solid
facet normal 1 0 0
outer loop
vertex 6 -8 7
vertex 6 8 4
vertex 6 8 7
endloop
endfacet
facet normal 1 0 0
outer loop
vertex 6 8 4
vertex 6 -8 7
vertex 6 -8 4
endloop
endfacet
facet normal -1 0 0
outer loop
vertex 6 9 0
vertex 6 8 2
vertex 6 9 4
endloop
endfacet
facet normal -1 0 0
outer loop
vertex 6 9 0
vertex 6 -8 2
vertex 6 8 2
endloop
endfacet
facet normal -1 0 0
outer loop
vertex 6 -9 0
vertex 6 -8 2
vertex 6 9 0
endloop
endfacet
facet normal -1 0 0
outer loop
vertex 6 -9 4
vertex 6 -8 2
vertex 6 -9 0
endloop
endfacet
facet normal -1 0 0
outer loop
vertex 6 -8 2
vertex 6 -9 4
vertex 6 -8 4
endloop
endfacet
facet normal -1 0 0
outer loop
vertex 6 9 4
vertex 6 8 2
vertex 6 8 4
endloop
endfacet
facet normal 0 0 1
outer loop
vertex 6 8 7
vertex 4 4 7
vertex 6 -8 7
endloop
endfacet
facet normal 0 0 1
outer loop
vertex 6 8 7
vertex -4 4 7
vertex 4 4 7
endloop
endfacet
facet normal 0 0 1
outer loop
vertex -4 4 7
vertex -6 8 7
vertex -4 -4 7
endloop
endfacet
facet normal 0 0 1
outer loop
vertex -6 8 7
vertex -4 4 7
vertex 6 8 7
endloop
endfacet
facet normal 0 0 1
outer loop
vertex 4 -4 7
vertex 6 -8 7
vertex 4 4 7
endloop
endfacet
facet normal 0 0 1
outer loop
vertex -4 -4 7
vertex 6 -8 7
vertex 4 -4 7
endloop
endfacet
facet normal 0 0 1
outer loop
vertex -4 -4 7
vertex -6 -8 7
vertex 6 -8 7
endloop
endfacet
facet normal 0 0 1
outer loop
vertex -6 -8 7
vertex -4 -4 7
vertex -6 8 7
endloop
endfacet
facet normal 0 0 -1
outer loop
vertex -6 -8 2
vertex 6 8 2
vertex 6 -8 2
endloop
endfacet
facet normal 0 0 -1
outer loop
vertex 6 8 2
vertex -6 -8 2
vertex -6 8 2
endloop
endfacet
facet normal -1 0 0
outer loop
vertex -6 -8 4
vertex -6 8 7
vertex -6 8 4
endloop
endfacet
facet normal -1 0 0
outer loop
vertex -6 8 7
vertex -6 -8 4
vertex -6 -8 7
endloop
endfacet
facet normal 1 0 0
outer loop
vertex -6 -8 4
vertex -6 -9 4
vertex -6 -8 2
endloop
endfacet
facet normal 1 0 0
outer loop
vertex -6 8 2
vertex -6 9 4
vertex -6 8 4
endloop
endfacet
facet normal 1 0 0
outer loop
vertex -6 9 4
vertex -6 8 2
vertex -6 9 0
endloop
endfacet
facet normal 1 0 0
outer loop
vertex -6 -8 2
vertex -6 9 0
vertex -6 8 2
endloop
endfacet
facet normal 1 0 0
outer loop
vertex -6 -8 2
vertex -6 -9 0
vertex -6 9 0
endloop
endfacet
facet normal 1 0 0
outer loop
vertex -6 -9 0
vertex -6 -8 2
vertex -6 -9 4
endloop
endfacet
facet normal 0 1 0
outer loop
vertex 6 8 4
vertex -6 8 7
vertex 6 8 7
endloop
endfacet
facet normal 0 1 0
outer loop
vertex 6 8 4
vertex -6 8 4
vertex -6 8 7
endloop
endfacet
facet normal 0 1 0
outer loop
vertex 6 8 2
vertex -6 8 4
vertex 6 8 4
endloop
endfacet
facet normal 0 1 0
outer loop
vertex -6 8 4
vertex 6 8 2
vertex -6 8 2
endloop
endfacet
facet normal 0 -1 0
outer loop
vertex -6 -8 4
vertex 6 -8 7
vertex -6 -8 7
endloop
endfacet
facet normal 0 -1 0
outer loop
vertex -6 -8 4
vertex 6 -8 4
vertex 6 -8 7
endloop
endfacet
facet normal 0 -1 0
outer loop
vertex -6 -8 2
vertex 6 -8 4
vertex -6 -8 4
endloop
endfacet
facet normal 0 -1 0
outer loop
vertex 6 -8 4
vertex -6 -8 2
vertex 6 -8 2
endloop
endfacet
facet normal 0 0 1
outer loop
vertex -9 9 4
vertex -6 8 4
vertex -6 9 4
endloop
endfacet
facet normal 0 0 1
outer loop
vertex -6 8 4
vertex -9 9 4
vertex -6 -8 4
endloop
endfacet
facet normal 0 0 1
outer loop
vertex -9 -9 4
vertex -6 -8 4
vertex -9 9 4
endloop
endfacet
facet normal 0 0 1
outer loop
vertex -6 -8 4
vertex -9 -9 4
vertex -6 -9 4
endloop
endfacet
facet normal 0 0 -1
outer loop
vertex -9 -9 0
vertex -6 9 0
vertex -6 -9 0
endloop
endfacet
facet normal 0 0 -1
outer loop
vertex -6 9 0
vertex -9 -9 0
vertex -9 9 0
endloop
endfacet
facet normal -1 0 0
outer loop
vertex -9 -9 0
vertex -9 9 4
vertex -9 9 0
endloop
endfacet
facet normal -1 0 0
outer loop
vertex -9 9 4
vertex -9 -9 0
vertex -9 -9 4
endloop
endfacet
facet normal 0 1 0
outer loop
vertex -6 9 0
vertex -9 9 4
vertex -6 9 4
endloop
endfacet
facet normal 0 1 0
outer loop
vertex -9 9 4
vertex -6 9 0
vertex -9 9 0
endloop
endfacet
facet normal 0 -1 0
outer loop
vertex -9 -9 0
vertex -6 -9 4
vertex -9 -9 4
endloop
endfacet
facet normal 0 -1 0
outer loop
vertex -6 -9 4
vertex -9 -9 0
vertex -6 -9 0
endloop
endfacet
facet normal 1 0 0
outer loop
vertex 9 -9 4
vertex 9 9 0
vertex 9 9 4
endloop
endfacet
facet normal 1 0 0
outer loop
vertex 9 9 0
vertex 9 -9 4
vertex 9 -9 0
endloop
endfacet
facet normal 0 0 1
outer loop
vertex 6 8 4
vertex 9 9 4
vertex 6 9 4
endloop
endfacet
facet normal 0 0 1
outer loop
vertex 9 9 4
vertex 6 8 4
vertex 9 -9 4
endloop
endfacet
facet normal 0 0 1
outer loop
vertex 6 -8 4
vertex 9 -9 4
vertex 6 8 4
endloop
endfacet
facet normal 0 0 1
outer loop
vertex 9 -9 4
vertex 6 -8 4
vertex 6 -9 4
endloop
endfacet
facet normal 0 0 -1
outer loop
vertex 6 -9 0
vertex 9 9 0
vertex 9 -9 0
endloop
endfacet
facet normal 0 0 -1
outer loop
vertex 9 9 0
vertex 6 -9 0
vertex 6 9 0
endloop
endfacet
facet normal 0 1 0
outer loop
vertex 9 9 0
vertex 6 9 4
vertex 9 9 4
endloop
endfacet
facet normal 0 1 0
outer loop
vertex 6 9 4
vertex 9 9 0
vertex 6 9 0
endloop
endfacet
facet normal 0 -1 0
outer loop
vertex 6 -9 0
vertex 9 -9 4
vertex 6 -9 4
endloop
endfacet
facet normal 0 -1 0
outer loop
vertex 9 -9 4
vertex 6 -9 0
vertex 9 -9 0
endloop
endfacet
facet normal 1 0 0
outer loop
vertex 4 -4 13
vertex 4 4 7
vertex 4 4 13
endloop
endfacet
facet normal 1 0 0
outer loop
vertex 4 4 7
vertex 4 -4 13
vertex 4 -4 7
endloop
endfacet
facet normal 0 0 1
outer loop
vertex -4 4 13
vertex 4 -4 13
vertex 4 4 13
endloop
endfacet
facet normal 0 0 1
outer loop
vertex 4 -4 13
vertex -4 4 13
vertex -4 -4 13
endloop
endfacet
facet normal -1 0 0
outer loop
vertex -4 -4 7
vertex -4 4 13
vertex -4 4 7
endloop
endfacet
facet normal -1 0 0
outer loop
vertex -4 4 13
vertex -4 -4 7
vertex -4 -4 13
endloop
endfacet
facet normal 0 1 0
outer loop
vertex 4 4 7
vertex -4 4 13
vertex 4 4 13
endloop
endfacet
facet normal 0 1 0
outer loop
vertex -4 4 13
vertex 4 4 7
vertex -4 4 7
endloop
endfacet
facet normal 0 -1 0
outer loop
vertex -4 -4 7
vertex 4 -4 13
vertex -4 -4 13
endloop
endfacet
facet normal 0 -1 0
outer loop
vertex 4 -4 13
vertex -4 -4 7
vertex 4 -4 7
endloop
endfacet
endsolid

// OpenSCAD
// Bulldozer Body
body_width = 12;
body_length = 16;
body_height = 5;

// Treads
tread_width = 3;
tread_height = 4;
tread_length = 18;

// Cabin
cabin_width = 8;
cabin_length = 8;
cabin_height = 6;

union() {
    // Chassis
    translate([-body_width/2, -body_length/2, tread_height/2])
        cube([body_width, body_length, body_height]);

    // Left Tread
    translate([-(body_width/2 + tread_width), -tread_length/2, 0])
        cube([tread_width, tread_length, tread_height]);

    // Right Tread
    translate([body_width/2, -tread_length/2, 0])
        cube([tread_width, tread_length, tread_height]);

    // Cabin
    translate([-cabin_width/2, -cabin_length/2, body_height + tread_height/2])
        cube([cabin_width, cabin_length, cabin_height]);
}
